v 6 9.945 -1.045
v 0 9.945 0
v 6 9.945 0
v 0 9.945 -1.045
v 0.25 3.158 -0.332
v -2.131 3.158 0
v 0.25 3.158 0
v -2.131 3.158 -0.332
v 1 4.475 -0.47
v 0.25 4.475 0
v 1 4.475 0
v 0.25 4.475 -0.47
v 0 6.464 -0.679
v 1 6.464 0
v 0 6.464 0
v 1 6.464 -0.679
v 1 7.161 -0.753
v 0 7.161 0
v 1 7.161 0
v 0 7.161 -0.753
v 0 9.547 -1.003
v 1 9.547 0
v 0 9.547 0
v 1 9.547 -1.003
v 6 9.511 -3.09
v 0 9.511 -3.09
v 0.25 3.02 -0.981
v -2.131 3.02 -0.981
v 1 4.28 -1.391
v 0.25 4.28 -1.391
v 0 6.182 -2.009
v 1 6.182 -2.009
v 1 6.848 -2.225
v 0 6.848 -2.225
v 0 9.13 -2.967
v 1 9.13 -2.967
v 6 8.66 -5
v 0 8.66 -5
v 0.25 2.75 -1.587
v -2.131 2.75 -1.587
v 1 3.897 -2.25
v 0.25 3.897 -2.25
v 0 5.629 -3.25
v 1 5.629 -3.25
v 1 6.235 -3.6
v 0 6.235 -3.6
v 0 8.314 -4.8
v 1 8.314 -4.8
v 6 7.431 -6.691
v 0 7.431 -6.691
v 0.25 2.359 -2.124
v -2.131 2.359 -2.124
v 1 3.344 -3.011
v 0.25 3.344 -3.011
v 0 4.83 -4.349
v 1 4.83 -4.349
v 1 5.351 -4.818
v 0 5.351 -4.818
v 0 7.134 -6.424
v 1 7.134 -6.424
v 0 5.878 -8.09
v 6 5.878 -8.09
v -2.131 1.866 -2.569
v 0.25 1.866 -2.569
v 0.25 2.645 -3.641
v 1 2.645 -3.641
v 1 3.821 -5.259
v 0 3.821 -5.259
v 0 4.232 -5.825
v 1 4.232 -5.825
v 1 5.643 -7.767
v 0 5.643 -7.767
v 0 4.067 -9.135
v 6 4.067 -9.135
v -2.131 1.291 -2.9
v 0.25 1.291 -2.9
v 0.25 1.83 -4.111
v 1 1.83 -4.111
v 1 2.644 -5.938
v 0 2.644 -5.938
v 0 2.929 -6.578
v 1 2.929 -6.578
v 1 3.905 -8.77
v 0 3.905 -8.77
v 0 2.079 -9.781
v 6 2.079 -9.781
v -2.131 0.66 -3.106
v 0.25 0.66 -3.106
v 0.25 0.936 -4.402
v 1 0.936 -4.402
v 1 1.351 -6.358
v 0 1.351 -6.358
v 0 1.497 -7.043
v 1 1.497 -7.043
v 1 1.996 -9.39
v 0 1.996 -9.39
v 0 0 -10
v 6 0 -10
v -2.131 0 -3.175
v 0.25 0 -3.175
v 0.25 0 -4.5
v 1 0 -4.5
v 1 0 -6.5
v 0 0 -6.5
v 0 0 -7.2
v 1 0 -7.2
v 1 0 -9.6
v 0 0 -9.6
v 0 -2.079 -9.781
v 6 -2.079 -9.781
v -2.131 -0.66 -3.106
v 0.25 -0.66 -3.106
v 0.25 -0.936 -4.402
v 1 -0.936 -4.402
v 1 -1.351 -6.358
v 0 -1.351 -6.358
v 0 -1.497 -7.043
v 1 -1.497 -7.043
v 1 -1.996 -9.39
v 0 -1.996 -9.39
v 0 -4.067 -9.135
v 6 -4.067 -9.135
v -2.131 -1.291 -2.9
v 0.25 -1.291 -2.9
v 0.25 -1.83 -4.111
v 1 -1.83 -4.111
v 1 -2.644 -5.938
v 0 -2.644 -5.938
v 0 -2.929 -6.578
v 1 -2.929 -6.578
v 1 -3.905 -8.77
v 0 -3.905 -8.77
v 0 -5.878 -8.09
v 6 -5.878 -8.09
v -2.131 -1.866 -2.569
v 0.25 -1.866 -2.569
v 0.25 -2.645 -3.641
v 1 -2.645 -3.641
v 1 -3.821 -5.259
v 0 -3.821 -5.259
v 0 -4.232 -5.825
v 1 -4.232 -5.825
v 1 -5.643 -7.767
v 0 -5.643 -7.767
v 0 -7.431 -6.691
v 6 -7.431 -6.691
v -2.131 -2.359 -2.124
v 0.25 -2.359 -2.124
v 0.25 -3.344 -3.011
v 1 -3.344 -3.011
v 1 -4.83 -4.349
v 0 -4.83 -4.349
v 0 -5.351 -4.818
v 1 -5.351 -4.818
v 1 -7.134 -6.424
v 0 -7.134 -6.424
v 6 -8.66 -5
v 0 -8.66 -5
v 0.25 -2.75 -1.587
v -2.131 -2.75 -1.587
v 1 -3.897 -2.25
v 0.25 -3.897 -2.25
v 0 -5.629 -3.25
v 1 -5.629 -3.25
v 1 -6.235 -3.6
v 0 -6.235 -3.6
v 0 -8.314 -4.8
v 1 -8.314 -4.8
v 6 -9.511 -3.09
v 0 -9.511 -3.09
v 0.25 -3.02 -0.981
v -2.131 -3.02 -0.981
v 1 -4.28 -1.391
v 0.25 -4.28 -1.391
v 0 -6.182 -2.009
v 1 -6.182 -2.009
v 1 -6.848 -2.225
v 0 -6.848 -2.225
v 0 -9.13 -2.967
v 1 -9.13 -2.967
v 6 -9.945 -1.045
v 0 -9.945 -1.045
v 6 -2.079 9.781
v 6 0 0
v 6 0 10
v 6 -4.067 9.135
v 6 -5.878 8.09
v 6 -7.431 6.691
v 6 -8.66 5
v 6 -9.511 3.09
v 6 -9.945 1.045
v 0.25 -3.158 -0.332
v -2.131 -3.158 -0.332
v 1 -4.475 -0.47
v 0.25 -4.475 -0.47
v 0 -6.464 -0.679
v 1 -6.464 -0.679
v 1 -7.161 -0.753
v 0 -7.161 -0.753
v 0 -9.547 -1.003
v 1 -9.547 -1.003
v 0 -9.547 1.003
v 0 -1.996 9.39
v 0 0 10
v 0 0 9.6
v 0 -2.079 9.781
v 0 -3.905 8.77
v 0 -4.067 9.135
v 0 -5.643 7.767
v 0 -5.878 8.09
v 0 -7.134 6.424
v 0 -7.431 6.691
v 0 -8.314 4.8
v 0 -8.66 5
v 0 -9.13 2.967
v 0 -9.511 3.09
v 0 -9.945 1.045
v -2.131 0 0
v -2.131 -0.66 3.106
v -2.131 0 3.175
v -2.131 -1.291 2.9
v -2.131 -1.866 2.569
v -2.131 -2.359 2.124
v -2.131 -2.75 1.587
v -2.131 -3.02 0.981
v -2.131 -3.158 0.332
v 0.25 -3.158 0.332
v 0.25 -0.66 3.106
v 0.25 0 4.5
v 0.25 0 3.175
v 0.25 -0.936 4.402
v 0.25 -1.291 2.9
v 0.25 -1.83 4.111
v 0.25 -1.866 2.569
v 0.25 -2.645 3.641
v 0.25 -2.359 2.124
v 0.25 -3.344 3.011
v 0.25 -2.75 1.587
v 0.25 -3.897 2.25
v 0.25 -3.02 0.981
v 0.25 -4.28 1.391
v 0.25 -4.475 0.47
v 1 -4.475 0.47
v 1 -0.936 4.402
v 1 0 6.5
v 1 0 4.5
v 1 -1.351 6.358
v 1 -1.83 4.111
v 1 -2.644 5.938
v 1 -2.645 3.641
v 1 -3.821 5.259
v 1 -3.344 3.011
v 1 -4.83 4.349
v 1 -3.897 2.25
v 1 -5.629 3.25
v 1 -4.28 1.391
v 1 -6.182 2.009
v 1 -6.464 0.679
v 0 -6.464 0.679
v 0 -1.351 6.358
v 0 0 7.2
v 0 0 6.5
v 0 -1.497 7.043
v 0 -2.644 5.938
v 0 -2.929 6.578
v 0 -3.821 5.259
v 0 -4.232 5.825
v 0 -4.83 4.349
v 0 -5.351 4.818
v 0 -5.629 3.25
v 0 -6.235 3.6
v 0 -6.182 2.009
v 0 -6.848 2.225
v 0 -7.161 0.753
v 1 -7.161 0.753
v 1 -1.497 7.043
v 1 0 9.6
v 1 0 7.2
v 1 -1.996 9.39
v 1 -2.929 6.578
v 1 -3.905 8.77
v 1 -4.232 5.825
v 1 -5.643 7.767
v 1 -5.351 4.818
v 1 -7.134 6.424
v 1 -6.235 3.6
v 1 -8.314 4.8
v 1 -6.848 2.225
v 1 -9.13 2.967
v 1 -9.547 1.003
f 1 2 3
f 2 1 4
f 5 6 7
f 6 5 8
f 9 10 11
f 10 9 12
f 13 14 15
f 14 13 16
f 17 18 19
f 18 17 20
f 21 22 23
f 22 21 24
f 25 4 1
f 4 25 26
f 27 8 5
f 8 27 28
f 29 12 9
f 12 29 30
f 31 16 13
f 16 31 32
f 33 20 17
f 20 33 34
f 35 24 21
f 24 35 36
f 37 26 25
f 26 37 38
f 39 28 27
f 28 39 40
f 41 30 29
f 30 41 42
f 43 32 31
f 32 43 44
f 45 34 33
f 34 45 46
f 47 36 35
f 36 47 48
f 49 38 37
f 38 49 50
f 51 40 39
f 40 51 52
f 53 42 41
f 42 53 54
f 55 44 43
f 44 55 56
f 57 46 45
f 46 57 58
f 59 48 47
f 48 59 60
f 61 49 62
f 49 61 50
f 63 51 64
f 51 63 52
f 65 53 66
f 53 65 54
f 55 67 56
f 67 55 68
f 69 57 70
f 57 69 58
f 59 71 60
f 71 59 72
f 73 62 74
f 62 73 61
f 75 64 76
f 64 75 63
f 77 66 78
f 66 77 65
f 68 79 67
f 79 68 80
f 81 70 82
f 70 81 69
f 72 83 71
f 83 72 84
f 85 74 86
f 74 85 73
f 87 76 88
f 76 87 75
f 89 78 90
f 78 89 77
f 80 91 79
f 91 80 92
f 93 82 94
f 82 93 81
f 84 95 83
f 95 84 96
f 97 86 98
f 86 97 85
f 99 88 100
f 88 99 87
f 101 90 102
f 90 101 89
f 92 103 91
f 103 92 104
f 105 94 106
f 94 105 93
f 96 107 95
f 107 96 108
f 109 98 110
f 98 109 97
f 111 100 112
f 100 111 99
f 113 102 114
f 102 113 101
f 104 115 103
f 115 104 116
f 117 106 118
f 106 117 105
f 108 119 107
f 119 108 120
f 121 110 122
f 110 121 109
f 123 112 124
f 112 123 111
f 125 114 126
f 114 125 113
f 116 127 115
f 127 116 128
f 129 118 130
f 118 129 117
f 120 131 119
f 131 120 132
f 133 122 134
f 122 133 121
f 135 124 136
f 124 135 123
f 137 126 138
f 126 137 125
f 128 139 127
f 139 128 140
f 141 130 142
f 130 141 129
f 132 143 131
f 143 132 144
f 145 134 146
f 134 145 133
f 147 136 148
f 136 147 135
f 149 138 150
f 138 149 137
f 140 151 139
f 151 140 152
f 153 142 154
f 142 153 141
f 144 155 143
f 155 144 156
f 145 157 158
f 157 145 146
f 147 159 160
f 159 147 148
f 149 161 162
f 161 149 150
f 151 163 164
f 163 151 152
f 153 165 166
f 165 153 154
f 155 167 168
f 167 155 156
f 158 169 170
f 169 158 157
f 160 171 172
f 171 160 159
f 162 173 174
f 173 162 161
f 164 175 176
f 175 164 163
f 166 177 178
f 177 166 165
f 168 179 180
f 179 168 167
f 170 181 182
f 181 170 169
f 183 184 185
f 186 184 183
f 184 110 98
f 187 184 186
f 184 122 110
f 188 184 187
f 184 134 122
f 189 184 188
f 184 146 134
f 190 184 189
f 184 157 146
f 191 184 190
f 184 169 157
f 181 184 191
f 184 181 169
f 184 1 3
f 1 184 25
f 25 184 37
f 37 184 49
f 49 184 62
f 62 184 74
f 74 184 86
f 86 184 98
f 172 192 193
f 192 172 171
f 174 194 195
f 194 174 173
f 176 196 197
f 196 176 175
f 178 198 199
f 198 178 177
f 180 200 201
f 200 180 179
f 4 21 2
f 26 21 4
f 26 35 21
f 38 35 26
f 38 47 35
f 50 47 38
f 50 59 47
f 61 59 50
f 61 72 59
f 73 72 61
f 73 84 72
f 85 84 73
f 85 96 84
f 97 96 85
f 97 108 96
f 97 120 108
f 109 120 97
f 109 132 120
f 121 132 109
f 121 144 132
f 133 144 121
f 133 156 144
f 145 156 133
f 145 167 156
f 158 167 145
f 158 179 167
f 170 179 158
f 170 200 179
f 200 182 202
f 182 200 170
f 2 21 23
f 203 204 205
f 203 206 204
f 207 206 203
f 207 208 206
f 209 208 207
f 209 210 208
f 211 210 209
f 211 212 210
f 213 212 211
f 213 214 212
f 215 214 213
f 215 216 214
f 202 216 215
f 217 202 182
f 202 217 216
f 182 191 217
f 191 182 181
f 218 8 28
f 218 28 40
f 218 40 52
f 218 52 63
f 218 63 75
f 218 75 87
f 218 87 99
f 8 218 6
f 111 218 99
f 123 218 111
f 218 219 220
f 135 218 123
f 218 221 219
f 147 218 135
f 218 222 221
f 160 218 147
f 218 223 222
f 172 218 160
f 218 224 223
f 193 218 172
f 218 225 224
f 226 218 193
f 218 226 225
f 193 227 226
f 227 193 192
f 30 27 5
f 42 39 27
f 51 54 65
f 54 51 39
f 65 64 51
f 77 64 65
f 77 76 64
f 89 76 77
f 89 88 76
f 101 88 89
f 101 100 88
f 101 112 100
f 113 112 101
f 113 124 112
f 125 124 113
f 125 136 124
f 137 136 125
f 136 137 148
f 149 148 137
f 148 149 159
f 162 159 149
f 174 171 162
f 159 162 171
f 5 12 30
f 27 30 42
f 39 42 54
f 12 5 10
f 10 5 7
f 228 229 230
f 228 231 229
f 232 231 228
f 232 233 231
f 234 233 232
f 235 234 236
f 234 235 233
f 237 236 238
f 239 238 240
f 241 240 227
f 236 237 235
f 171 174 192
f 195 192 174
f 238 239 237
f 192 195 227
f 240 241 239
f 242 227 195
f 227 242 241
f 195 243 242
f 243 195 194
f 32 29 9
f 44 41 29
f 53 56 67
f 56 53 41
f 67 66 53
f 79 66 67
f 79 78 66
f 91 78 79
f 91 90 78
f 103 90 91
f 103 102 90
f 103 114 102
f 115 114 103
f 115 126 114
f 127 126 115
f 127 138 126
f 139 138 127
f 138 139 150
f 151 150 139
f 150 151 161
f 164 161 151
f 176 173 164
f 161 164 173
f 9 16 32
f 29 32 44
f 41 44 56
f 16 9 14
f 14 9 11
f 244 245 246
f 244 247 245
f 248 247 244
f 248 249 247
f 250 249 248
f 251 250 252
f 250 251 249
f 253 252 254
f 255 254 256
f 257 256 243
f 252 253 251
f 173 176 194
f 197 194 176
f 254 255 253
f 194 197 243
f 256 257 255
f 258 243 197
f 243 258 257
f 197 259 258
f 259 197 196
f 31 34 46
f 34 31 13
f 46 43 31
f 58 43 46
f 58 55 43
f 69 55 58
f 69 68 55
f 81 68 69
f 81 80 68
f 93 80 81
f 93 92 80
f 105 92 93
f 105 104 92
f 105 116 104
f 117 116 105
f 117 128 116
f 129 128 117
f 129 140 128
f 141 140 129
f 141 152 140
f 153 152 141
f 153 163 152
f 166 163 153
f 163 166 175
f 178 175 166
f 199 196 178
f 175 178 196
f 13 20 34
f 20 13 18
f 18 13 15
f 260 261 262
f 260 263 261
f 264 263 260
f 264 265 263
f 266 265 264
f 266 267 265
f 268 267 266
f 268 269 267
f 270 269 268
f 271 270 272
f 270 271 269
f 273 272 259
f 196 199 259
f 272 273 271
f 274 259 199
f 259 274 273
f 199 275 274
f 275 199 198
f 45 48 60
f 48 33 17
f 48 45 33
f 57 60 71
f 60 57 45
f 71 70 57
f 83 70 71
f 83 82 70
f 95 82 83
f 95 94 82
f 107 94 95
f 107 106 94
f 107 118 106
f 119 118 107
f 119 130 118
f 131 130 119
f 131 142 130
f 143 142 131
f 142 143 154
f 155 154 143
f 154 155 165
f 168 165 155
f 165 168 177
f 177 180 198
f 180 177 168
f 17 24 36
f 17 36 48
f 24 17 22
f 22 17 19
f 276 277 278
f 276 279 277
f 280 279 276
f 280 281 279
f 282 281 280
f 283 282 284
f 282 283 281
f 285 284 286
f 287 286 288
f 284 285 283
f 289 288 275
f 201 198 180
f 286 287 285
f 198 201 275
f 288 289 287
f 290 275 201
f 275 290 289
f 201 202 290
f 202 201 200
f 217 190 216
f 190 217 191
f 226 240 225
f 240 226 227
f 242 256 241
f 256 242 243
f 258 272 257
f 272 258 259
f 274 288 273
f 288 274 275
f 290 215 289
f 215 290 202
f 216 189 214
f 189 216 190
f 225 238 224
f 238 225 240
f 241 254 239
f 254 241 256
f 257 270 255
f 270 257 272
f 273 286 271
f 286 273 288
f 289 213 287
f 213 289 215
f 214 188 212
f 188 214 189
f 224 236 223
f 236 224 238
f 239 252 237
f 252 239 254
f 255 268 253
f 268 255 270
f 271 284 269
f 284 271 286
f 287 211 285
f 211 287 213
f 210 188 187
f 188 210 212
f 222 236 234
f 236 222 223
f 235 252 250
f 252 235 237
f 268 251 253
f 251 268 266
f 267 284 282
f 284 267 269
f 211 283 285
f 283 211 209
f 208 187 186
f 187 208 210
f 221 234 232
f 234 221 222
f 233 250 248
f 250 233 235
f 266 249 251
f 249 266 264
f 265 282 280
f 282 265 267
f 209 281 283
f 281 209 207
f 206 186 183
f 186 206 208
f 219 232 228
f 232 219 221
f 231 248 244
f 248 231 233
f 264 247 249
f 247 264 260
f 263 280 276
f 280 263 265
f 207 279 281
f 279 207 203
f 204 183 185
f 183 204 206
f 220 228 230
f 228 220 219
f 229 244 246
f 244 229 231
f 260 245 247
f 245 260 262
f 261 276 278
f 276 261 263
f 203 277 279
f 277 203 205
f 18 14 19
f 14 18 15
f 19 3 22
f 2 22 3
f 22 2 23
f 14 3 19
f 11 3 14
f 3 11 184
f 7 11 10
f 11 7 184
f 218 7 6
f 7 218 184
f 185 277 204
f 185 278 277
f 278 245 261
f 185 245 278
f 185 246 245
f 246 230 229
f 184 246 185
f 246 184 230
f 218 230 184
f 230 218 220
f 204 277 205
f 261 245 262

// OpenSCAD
// file: ../config.scad
core_radius=10;
core_thickness=6;

body_radius=28;
body_width=22;
round_body_rim_thickness=8;
bearing_width=4.762;
bearing_mount_offset=0.25;
core_center_bump_height=bearing_width/2-bearing_mount_offset;
bearing_center_offset=-bearing_width/2+bearing_mount_offset;
edge_radius=0.5;
// main file
include <../config.scad>;

pad_groove_outer_radius=9.6;
pad_groove_inner_radius=7.2;
pad_groove_depth=1;
bearing_groove_outer_radius=6.5;
bearing_groove_mid_radius=4.5;
bearing_groove_inner_radius=3.175;
bearing_groove_min_depth=bearing_mount_offset;
bearing_groove_max_depth=pad_groove_depth;


module core_profile() {

    module base() {
            translate([0, pad_groove_depth, 0]) square( [core_radius, core_thickness - pad_groove_depth]);
    }
    module outer_wall() {
        radius=core_radius - pad_groove_outer_radius;
        translate([core_radius, pad_groove_depth, 0]) rotate([0, 0, 180]) square([radius, pad_groove_depth]);
    }
    module inner_wall() {
        thickness=pad_groove_inner_radius - bearing_groove_outer_radius;
        translate([bearing_groove_outer_radius, 0, 0]) square([thickness, core_thickness]);

    }
    module center_bump() {
        translate([0, -core_center_bump_height, 0]) square([bearing_groove_inner_radius, core_thickness]);
    }
    module bearing_groove() {
        translate([0, bearing_groove_min_depth, 0]) square([bearing_groove_mid_radius, core_thickness-bearing_groove_min_depth]);
    }
        
        
    union() {
        base();
        outer_wall();
        center_bump();
        inner_wall();
        bearing_groove();
    }
}
//core_plane();

module core_base() {
    rotate([0, 90, 0]) rotate_extrude() core_profile();
}
    
difference() {
    core_base();
    translate([-core_center_bump_height, 0, 0]) cube([core_center_bump_height + core_thickness, core_radius, core_radius]);
}
//pad_hole();
//bearing_hole();
